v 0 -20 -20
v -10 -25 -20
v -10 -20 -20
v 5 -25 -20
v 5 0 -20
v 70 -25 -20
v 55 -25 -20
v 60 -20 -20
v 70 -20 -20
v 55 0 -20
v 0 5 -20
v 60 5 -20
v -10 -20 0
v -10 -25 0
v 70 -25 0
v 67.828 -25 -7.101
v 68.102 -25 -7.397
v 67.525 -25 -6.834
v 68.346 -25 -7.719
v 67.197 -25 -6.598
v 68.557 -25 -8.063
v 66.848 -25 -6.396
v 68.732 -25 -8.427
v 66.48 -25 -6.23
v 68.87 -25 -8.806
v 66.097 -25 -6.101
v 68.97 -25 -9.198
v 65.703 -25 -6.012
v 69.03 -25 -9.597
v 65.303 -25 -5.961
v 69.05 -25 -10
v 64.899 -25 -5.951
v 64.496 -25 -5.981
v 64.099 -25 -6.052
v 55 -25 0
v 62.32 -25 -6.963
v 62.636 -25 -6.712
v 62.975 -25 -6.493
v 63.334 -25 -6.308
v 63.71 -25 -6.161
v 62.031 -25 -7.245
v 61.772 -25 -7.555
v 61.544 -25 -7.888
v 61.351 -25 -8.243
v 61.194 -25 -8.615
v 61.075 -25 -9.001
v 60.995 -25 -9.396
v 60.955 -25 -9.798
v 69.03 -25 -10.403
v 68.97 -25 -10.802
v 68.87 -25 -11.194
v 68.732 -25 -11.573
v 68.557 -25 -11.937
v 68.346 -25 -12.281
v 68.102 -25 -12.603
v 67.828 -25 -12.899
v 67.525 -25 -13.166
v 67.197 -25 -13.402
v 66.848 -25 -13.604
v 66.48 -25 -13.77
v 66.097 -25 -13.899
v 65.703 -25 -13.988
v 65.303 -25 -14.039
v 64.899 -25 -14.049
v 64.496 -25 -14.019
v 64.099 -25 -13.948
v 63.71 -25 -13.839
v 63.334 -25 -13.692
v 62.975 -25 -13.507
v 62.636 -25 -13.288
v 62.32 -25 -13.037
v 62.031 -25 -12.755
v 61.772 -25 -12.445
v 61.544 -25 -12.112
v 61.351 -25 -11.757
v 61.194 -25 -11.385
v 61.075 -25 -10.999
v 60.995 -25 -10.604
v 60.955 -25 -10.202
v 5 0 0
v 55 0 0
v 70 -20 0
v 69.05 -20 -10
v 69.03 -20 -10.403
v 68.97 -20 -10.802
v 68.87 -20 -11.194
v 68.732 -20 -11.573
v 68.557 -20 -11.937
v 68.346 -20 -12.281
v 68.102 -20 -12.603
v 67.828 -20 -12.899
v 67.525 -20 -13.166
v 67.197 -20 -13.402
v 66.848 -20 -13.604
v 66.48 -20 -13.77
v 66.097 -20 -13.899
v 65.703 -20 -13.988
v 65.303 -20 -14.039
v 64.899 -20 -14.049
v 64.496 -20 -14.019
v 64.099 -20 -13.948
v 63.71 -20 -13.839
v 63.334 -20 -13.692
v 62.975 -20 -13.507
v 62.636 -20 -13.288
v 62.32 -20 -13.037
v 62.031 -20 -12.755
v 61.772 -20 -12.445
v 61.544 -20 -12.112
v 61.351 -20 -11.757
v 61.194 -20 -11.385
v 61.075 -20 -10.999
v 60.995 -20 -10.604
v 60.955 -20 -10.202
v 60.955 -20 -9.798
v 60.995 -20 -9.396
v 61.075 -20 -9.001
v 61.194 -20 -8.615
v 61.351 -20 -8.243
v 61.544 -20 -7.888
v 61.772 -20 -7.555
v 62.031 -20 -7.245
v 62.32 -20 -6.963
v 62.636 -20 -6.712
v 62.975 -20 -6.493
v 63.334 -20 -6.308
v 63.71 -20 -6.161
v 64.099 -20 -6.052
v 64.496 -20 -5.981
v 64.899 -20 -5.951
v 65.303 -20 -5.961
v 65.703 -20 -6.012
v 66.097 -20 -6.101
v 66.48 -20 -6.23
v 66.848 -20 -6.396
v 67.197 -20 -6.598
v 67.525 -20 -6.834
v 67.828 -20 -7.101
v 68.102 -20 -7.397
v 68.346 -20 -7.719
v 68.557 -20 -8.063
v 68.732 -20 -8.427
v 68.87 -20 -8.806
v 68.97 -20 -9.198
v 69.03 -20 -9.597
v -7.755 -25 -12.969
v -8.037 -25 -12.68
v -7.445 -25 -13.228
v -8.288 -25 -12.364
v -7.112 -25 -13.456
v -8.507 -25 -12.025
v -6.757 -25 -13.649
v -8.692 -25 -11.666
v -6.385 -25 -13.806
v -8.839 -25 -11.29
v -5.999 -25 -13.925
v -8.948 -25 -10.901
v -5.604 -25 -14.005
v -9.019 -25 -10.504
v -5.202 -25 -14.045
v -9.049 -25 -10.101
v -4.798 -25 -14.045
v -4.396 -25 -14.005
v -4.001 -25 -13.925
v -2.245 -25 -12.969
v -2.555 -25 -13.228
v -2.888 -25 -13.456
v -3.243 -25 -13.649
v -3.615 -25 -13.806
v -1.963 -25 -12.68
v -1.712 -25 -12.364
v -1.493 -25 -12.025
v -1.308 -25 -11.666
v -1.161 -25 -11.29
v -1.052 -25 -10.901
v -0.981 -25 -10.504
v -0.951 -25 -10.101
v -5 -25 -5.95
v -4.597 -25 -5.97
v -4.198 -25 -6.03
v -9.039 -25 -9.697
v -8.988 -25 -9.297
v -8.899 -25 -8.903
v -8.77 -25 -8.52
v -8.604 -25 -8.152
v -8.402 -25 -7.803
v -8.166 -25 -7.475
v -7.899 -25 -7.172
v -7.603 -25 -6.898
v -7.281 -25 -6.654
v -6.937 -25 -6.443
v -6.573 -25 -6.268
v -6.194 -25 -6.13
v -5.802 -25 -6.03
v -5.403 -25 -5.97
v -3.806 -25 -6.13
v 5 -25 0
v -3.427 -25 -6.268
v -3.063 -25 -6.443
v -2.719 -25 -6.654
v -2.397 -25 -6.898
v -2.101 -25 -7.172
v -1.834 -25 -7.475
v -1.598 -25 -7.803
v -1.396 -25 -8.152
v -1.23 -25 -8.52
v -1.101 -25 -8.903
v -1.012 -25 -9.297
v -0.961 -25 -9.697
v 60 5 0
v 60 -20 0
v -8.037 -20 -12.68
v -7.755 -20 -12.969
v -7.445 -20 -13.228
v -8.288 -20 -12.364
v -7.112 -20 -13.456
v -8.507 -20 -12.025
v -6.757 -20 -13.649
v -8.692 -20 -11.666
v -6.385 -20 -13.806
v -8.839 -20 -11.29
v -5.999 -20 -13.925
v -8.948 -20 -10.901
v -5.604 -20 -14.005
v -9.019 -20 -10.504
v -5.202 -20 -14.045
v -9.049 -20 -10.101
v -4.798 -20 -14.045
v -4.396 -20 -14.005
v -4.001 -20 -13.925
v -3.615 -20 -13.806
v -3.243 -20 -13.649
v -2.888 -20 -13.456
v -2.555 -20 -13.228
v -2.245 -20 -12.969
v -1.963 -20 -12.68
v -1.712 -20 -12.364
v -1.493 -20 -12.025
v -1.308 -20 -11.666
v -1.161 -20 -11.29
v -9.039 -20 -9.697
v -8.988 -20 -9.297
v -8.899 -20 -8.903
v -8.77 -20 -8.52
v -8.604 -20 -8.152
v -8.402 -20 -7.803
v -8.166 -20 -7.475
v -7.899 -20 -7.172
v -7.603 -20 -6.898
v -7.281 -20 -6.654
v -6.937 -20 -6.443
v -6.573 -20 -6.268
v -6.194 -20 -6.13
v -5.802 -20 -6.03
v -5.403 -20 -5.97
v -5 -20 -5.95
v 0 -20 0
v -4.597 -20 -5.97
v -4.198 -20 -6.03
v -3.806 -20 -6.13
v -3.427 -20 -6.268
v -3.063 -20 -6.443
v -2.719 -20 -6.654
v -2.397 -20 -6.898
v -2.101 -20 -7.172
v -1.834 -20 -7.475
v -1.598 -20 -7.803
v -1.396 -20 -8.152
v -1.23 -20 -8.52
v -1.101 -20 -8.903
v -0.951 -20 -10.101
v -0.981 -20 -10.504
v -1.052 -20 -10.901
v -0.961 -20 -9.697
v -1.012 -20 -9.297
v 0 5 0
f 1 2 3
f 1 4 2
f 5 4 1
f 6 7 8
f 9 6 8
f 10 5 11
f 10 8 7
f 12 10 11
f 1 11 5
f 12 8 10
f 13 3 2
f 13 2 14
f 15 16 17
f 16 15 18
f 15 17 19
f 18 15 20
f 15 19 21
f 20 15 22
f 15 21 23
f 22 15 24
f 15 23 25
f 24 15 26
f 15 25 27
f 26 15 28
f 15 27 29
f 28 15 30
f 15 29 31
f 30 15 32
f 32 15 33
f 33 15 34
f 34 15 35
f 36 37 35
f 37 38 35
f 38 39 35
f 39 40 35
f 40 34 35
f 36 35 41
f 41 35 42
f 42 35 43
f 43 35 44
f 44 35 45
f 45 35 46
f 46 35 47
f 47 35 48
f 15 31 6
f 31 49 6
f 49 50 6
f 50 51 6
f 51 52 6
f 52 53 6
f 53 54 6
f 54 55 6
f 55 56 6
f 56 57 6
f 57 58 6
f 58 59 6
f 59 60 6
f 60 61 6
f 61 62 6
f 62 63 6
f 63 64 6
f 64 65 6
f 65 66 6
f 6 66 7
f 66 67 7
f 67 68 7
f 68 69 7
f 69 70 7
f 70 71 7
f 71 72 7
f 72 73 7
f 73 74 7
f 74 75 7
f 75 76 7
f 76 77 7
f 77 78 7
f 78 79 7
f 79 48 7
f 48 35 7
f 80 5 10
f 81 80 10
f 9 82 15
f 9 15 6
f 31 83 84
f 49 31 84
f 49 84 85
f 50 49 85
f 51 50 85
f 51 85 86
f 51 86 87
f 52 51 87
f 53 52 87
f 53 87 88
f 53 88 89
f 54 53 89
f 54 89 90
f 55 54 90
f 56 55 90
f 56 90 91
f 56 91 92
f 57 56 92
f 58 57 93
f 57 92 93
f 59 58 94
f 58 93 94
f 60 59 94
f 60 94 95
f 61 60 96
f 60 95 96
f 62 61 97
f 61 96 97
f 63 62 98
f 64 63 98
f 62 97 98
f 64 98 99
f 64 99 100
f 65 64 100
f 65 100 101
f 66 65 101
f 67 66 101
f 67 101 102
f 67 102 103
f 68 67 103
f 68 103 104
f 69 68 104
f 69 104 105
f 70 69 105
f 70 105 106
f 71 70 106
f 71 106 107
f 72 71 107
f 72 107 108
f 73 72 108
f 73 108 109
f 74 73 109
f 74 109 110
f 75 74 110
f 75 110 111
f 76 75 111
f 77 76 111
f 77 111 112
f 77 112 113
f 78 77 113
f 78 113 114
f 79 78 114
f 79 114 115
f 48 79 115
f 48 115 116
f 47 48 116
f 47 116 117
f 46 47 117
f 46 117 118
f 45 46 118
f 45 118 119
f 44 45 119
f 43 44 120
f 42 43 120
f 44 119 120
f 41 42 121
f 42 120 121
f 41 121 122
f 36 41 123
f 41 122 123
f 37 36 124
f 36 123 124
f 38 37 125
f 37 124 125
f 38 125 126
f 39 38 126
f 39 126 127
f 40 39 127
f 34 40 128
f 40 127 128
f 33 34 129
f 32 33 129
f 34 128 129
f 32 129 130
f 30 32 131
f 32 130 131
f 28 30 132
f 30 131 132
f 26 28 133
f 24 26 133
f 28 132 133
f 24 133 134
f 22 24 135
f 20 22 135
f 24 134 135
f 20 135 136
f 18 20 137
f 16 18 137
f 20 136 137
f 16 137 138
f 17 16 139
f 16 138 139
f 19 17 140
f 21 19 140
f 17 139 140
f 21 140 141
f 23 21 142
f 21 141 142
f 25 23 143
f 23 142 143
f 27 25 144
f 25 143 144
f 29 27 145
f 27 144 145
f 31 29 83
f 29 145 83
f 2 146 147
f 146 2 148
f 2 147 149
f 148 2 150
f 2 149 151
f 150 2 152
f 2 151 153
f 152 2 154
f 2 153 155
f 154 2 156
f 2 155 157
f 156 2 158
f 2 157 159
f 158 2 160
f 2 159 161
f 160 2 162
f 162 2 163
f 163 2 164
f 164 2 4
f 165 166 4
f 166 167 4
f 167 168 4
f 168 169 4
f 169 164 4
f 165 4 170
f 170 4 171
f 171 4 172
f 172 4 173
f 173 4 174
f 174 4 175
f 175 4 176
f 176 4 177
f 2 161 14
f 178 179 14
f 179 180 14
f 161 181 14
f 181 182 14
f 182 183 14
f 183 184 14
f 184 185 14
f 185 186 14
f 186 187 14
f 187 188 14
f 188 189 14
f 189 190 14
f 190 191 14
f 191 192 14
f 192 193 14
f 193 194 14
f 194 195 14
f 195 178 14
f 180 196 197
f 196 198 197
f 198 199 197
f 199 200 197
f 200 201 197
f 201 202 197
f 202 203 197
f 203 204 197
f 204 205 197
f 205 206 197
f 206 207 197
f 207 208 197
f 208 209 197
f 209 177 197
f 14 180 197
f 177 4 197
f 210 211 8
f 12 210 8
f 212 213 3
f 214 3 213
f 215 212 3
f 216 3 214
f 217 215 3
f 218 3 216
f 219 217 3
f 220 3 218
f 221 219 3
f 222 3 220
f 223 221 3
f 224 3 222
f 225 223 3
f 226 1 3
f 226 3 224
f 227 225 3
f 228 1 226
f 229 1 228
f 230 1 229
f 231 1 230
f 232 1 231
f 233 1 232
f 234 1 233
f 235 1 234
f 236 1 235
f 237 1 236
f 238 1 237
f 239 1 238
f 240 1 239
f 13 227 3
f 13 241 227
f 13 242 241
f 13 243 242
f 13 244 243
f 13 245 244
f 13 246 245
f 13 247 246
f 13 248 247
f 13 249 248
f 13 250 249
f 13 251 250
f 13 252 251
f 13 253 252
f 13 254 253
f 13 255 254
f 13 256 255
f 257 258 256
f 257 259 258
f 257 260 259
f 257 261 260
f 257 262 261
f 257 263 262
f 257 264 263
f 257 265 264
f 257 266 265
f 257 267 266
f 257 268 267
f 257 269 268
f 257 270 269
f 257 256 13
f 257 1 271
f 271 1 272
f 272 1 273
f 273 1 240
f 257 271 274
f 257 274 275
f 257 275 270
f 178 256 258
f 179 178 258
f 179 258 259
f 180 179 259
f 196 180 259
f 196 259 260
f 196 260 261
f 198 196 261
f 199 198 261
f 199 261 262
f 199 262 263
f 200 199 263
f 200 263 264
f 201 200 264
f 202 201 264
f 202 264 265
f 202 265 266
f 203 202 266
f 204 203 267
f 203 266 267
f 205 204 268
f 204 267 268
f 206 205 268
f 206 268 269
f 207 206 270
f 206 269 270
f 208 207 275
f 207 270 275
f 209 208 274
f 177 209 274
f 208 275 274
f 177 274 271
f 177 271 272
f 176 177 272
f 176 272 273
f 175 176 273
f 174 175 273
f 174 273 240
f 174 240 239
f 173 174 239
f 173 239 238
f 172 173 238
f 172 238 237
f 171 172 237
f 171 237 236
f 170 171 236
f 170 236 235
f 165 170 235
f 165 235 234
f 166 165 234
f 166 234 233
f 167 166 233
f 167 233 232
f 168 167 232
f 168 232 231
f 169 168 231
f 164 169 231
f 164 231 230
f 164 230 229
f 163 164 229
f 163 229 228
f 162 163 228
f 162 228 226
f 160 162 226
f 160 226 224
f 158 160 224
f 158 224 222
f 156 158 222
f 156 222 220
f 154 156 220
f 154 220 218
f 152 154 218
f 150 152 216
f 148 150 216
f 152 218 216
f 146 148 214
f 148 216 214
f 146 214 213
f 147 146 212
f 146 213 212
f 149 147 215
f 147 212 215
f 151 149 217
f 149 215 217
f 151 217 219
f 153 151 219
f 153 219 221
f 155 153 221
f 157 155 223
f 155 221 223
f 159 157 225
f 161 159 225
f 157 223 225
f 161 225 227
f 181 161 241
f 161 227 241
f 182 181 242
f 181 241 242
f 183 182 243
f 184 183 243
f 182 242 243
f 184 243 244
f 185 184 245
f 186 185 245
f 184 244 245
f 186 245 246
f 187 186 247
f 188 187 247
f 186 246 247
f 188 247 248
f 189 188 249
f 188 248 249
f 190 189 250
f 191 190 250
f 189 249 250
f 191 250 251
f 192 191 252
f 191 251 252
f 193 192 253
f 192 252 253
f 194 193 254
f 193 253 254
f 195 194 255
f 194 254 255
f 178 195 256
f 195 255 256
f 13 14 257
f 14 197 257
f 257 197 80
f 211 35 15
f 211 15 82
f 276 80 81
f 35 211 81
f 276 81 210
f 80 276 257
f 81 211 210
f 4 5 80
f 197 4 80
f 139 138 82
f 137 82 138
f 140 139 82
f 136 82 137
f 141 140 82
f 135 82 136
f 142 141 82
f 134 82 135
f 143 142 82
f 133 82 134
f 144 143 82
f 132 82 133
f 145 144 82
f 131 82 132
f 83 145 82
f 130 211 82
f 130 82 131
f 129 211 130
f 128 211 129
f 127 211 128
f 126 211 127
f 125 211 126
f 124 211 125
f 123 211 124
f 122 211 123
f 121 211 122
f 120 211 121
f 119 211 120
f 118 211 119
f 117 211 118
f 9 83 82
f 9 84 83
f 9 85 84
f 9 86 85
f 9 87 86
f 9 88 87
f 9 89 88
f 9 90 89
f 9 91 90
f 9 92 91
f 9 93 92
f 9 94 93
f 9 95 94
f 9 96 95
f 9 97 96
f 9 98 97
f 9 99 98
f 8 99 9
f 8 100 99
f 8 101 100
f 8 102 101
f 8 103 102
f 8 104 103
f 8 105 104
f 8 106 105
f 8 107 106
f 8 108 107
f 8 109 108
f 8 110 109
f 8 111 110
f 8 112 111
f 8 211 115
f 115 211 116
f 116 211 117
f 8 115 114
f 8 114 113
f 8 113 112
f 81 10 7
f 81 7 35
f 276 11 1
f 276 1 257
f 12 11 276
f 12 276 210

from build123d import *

# Parameters (mm, degrees)
SKETCH1_W           = 60
SKETCH1_H           = 20
BOSS_EXTRUDE1_DEPTH = 5
SKETCH2_W           = 5
SKETCH2_H           = 20
BOSS_EXTRUDE2_DEPTH = 25
SKETCH3_W           = 20
SKETCH3_H           = 5
BOSS_EXTRUDE3_DEPTH = 10
SKETCH4_W           = 20
SKETCH4_H           = 5
BOSS_EXTRUDE4_DEPTH = 10
SKETCH5_R           = 4.05
CUT_EXTRUDE1_DEPTH  = 20


with BuildPart() as part:
    # Sketch1 → Boss-Extrude1 (new body)
    with BuildSketch(Plane(origin=(0, 0, 0), x_dir=(1, 0, 0), z_dir=(0, 1, 0))):
        with Locations((30, 10)):
            Rectangle(SKETCH1_W, SKETCH1_H)
    extrude(amount=BOSS_EXTRUDE1_DEPTH)

    # Sketch2 → Boss-Extrude2 (add)
    with BuildSketch(Plane.XZ):
        with Locations((2.5, -10)):
            Rectangle(SKETCH2_W, SKETCH2_H)
        with Locations((57.5, -10)):
            Rectangle(SKETCH2_W, SKETCH2_H)
    extrude(amount=BOSS_EXTRUDE2_DEPTH)

    # Sketch3 → Boss-Extrude3 (add)
    with BuildSketch(Plane(origin=(60, 0, 0), x_dir=(0, 0, -1), z_dir=(1, 0, 0))):
        with Locations((10, -22.5)):
            Rectangle(SKETCH3_W, SKETCH3_H)
    extrude(amount=BOSS_EXTRUDE3_DEPTH)

    # Sketch4 → Boss-Extrude4 (add)
    with BuildSketch(Plane.ZY):
        with Locations((-10, -22.5)):
            Rectangle(SKETCH4_W, SKETCH4_H)
    extrude(amount=BOSS_EXTRUDE4_DEPTH)

    # Sketch5 → Cut-Extrude1 (cut)
    with BuildSketch(Plane(origin=(0, -20, 0), x_dir=(1, 0, 0), z_dir=(0, 1, 0))):
        with BuildLine():
            ThreePointArc((60.95, 10), (65, 5.95), (69.05, 10))
            Line((69.05, 10), (60.95, 10))
        make_face()
        with BuildLine():
            Line((60.95, 10), (69.05, 10))
            ThreePointArc((69.05, 10), (65, 14.05), (60.95, 10))
        make_face()
        with Locations(Location((-5, 10, 0), (0, 0, 270))):
            Circle(SKETCH5_R)
    extrude(amount=-CUT_EXTRUDE1_DEPTH, mode=Mode.SUBTRACT)


solid = part.part
